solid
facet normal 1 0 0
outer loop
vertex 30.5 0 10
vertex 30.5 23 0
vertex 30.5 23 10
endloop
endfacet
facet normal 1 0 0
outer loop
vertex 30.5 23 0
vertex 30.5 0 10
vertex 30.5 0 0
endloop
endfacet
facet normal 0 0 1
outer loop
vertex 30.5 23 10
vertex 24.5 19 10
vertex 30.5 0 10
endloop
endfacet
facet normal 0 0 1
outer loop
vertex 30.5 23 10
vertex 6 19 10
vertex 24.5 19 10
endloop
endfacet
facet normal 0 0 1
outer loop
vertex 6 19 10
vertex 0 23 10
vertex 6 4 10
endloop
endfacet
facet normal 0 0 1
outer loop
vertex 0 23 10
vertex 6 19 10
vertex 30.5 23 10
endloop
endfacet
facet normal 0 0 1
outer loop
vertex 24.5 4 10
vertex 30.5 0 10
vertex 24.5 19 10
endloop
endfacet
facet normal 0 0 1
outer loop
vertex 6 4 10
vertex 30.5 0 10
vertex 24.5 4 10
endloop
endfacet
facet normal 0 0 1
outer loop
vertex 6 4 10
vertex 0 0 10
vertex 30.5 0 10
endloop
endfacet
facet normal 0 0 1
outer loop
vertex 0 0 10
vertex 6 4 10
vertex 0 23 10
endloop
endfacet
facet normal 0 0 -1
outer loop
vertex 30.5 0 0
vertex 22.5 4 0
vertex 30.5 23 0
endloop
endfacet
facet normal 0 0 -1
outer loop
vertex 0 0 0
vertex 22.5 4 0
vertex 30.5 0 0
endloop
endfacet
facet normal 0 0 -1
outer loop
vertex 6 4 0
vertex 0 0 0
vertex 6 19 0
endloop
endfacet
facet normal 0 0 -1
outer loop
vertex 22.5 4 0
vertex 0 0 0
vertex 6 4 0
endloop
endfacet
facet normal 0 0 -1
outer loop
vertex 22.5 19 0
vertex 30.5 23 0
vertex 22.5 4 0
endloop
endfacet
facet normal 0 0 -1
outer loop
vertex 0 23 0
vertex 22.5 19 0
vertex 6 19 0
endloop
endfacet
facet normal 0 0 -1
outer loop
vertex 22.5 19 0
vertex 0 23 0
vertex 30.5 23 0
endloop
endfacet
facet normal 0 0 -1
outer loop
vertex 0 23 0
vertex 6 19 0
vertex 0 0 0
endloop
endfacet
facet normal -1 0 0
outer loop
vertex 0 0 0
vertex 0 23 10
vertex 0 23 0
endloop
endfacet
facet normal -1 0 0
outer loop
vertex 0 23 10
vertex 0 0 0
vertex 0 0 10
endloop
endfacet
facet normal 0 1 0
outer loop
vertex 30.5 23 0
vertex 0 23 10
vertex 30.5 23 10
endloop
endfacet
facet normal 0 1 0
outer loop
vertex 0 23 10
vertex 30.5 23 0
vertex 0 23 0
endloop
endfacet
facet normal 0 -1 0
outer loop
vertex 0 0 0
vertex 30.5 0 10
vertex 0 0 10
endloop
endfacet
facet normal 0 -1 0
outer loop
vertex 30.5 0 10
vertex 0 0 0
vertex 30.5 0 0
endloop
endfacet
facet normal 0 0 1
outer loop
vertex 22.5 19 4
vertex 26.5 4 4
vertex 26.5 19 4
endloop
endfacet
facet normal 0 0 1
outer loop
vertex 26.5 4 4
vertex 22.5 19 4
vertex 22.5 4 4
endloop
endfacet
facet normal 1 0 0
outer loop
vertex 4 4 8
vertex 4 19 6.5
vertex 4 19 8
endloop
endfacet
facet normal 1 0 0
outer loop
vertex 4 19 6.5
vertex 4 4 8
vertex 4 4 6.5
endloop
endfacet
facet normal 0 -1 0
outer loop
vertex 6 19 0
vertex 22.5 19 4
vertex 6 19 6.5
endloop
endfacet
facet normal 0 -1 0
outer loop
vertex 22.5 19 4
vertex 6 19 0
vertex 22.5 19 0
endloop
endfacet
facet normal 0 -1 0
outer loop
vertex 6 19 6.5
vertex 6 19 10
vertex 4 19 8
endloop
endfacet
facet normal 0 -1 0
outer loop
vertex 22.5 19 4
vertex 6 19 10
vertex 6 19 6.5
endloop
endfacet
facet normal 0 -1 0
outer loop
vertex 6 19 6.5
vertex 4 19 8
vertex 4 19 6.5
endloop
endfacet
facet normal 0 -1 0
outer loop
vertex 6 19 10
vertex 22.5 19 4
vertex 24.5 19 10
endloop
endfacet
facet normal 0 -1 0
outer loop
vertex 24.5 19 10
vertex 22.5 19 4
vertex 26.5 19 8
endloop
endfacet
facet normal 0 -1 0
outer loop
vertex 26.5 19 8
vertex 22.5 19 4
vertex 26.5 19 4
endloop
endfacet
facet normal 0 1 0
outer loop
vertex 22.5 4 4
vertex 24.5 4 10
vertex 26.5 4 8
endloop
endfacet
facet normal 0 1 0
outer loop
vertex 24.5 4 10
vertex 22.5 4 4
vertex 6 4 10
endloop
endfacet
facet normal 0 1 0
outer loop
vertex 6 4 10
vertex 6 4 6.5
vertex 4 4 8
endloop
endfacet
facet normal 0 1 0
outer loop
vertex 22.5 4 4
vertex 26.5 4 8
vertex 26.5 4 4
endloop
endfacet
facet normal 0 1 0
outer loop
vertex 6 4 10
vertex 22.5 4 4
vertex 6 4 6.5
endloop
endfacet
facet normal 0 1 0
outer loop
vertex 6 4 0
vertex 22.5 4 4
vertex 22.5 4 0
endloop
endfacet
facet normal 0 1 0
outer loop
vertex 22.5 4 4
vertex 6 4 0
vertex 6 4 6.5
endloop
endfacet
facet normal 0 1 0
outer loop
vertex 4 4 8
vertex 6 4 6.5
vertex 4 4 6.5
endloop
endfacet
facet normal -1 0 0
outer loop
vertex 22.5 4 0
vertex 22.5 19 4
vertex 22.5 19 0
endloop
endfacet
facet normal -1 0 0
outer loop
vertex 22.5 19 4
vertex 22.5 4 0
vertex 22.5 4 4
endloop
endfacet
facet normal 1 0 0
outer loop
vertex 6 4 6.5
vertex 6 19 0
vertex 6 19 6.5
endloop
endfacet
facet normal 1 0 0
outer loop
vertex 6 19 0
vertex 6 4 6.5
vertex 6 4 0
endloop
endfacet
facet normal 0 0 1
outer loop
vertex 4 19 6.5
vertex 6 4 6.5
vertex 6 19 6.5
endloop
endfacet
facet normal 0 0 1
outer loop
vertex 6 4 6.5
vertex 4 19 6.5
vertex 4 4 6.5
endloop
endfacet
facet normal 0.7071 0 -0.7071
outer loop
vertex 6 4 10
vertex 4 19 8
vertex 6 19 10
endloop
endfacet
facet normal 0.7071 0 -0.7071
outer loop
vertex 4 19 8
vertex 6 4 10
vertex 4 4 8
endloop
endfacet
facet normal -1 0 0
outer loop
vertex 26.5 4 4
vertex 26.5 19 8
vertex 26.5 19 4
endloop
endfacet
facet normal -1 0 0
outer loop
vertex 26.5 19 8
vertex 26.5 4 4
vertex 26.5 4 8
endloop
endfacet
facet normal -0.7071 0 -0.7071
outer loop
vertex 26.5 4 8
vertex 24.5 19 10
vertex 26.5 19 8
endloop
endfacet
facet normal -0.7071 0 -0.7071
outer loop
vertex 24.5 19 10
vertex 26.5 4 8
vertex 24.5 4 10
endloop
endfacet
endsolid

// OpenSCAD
jack_length = 16.5;
jack_width = 15;

wall_height = 10;
wall_thickness = 4;

catch_overhang = 2;

small_clip_depth = catch_overhang;
big_clip_depth = catch_overhang + 2;
big_clip_clearance = 4;
small_clip_clearance = 6.5;

outer_length =
    jack_length + small_clip_depth + big_clip_depth + (wall_thickness * 2);
outer_width = jack_width + (wall_thickness * 2);

module clip_catch() {
  rotate([ 90, 0, 0 ]) {
    linear_extrude(height = outer_width) {
      polygon(points =
                  [
                    [ 0, 0 ], [ catch_overhang, 0 ],
                    [ wall_thickness, catch_overhang ], [ 0, catch_overhang ]
                  ],
              paths = [[ 0, 1, 2, 3 ]]);
    }
  }
}

module keystone() {
  union() {
    difference() {
      difference() {
        cube([ outer_length, outer_width, wall_height ]);
        translate([ wall_thickness, wall_thickness, big_clip_clearance ]) {
          cube([ outer_length, jack_width, wall_height ]);
        }
      }
      translate([ wall_thickness + small_clip_depth, wall_thickness, 0 ]) {
        cube([ jack_length, jack_width, wall_height + 1 ]);
      }
    }

    cube([ wall_thickness, outer_width, wall_height ]);

    cube([
      wall_thickness + small_clip_depth, outer_width,
      small_clip_clearance
    ]);

    translate([ 2, 23, 8 ]) {
      clip_catch();
    }

    translate([ 26.5, 0, 0 ]) {
      cube([ 4, 23, 10 ]);
    }

    translate([ 28.5, 0, 8 ]) {
      rotate([ 0, 0, -180 ]) {
        clip_catch();
      }
    }
  }
}

keystone();
